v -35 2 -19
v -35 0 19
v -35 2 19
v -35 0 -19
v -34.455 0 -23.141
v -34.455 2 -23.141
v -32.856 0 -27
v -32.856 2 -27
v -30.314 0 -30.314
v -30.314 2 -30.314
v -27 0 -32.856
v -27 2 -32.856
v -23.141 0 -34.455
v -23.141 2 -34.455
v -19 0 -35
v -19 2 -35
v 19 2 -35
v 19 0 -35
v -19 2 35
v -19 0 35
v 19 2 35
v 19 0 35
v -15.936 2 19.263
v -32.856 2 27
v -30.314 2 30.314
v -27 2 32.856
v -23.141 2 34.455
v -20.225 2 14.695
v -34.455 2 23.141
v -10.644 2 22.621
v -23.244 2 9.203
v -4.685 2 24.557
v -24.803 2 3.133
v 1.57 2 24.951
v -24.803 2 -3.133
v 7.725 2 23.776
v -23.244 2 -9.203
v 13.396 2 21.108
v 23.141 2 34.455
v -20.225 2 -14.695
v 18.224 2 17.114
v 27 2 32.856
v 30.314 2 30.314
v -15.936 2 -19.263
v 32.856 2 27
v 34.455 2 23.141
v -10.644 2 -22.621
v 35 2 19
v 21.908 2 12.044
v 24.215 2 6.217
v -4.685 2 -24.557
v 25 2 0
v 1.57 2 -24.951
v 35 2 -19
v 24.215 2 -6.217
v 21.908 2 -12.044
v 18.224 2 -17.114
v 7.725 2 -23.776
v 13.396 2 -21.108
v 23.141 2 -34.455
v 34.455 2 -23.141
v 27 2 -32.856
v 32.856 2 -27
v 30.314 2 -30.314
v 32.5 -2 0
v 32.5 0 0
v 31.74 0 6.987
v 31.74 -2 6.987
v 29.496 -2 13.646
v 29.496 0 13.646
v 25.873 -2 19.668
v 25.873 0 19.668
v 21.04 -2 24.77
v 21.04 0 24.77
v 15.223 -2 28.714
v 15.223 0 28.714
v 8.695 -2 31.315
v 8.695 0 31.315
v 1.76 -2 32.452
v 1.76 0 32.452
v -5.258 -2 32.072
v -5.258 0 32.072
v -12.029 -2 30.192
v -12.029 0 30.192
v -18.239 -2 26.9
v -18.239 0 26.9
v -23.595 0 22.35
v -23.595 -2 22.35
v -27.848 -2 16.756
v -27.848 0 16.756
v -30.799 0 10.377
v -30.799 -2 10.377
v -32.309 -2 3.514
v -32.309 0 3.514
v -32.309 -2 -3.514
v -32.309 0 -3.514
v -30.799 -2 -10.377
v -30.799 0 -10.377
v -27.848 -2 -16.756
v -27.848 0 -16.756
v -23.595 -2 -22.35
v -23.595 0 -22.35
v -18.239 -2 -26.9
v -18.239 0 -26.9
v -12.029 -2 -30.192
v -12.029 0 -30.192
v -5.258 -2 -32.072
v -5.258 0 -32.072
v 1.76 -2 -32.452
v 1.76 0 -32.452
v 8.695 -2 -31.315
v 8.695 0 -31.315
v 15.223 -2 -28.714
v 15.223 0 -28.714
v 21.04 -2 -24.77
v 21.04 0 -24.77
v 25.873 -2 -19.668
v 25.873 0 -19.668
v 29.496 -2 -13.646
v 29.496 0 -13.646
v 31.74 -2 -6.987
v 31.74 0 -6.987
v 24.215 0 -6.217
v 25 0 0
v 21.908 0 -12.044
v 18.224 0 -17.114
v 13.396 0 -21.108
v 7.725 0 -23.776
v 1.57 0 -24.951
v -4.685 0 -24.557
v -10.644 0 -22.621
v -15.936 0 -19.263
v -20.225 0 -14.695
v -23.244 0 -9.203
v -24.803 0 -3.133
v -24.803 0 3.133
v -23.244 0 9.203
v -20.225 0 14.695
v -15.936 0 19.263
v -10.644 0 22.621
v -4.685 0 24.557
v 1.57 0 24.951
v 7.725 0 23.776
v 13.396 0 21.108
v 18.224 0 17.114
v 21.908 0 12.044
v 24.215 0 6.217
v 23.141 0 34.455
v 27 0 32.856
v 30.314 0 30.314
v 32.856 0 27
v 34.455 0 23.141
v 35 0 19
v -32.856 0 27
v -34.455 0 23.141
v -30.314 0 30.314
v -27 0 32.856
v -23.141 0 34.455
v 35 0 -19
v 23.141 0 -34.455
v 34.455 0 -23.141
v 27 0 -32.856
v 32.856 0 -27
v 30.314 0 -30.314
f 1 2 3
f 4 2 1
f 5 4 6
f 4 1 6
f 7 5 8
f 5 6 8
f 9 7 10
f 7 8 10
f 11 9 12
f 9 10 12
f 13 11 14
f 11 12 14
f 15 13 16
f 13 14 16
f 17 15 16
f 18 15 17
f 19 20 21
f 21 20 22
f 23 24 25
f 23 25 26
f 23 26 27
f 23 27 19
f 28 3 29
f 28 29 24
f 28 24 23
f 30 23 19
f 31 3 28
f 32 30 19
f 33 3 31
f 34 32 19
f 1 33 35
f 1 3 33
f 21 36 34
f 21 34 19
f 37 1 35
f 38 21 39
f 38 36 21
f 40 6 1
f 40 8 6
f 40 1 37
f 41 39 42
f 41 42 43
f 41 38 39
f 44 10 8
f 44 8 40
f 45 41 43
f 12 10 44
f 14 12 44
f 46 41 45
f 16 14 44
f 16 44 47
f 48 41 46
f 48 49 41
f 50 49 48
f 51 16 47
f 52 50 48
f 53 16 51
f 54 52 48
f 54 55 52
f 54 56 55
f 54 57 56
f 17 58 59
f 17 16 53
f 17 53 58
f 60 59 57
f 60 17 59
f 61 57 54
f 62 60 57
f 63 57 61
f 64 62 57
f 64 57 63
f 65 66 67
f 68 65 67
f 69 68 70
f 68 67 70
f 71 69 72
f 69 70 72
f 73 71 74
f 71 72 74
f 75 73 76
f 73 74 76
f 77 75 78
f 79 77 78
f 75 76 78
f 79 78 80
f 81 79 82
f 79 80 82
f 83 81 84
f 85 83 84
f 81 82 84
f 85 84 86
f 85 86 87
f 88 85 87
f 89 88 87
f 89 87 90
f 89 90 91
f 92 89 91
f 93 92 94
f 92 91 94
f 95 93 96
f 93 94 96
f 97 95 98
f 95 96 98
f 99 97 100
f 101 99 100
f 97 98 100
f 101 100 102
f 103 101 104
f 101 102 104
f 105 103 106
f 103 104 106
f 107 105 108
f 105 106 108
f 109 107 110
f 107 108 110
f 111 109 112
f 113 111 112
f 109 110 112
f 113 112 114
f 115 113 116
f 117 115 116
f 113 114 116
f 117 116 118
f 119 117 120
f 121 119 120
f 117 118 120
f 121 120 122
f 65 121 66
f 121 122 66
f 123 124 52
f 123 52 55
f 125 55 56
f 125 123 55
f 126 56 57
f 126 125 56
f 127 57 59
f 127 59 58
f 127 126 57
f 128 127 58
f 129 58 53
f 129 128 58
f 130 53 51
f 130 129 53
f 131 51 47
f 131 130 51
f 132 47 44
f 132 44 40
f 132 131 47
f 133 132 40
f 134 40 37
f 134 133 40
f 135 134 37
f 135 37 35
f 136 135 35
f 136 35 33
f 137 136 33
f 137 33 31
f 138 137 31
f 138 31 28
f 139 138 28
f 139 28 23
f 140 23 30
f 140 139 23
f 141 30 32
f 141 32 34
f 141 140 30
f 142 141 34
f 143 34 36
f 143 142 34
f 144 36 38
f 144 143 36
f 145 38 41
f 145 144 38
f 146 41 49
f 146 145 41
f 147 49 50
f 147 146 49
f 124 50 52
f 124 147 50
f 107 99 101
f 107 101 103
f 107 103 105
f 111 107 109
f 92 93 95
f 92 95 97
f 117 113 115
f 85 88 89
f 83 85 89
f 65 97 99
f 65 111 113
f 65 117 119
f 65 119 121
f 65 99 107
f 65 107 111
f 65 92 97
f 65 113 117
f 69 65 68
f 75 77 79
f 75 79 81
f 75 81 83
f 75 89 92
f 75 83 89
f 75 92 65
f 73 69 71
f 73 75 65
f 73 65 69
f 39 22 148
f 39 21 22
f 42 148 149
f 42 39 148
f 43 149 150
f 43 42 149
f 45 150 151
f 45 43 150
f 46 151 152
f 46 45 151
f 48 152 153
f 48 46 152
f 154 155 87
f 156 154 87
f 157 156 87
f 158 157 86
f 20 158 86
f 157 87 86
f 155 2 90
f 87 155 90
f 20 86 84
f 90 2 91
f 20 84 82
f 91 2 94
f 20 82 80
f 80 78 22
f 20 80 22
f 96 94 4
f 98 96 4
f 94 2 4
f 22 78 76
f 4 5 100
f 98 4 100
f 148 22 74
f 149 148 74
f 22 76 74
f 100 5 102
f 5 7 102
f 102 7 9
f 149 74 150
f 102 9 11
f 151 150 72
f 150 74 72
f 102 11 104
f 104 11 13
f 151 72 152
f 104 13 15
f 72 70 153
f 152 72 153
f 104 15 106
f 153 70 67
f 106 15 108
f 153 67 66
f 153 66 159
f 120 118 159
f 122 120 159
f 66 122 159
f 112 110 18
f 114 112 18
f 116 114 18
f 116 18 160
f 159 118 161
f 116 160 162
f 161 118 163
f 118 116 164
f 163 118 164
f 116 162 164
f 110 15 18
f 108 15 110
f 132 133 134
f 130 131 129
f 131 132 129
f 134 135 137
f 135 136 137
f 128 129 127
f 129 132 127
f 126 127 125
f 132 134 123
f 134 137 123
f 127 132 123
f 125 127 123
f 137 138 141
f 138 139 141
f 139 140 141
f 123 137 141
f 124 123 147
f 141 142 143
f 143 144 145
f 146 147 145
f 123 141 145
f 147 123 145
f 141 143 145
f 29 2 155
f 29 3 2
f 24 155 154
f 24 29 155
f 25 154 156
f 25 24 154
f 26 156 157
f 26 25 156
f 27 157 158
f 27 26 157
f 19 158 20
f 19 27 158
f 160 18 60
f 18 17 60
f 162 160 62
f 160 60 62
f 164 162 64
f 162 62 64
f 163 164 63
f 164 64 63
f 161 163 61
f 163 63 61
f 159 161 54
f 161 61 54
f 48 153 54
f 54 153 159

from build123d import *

# Parameters (mm, degrees)
SKETCH1_W           = 70
SKETCH1_H           = 70
SKETCH1_R           = 25
BOSS_EXTRUDE1_DEPTH = 2
FILLET1_R           = 16
SKETCH2_R           = 32.5
BOSS_EXTRUDE2_DEPTH = 2


with BuildPart() as part:
    # Sketch1 → Boss-Extrude1 (new body)
    with BuildSketch(Plane(origin=(0, 0, 0), x_dir=(1, 0, 0), z_dir=(0, 1, 0))):
        Rectangle(SKETCH1_W, SKETCH1_H)
        Circle(SKETCH1_R, mode=Mode.SUBTRACT)
    extrude(amount=BOSS_EXTRUDE1_DEPTH)

    # Fillet1
    fillet1_edges = [part.edges().sort_by_distance(p)[0] for p in [
        (35, 1, 35),
        (-35, 1, 35),
        (-35, 1, -35),
        (35, 1, -35),
    ]]
    fillet(fillet1_edges, radius=FILLET1_R)

    # Sketch2 → Boss-Extrude2 (add)
    with BuildSketch(Plane.XZ):
        Circle(SKETCH2_R)
    extrude(amount=BOSS_EXTRUDE2_DEPTH)


solid = part.part
